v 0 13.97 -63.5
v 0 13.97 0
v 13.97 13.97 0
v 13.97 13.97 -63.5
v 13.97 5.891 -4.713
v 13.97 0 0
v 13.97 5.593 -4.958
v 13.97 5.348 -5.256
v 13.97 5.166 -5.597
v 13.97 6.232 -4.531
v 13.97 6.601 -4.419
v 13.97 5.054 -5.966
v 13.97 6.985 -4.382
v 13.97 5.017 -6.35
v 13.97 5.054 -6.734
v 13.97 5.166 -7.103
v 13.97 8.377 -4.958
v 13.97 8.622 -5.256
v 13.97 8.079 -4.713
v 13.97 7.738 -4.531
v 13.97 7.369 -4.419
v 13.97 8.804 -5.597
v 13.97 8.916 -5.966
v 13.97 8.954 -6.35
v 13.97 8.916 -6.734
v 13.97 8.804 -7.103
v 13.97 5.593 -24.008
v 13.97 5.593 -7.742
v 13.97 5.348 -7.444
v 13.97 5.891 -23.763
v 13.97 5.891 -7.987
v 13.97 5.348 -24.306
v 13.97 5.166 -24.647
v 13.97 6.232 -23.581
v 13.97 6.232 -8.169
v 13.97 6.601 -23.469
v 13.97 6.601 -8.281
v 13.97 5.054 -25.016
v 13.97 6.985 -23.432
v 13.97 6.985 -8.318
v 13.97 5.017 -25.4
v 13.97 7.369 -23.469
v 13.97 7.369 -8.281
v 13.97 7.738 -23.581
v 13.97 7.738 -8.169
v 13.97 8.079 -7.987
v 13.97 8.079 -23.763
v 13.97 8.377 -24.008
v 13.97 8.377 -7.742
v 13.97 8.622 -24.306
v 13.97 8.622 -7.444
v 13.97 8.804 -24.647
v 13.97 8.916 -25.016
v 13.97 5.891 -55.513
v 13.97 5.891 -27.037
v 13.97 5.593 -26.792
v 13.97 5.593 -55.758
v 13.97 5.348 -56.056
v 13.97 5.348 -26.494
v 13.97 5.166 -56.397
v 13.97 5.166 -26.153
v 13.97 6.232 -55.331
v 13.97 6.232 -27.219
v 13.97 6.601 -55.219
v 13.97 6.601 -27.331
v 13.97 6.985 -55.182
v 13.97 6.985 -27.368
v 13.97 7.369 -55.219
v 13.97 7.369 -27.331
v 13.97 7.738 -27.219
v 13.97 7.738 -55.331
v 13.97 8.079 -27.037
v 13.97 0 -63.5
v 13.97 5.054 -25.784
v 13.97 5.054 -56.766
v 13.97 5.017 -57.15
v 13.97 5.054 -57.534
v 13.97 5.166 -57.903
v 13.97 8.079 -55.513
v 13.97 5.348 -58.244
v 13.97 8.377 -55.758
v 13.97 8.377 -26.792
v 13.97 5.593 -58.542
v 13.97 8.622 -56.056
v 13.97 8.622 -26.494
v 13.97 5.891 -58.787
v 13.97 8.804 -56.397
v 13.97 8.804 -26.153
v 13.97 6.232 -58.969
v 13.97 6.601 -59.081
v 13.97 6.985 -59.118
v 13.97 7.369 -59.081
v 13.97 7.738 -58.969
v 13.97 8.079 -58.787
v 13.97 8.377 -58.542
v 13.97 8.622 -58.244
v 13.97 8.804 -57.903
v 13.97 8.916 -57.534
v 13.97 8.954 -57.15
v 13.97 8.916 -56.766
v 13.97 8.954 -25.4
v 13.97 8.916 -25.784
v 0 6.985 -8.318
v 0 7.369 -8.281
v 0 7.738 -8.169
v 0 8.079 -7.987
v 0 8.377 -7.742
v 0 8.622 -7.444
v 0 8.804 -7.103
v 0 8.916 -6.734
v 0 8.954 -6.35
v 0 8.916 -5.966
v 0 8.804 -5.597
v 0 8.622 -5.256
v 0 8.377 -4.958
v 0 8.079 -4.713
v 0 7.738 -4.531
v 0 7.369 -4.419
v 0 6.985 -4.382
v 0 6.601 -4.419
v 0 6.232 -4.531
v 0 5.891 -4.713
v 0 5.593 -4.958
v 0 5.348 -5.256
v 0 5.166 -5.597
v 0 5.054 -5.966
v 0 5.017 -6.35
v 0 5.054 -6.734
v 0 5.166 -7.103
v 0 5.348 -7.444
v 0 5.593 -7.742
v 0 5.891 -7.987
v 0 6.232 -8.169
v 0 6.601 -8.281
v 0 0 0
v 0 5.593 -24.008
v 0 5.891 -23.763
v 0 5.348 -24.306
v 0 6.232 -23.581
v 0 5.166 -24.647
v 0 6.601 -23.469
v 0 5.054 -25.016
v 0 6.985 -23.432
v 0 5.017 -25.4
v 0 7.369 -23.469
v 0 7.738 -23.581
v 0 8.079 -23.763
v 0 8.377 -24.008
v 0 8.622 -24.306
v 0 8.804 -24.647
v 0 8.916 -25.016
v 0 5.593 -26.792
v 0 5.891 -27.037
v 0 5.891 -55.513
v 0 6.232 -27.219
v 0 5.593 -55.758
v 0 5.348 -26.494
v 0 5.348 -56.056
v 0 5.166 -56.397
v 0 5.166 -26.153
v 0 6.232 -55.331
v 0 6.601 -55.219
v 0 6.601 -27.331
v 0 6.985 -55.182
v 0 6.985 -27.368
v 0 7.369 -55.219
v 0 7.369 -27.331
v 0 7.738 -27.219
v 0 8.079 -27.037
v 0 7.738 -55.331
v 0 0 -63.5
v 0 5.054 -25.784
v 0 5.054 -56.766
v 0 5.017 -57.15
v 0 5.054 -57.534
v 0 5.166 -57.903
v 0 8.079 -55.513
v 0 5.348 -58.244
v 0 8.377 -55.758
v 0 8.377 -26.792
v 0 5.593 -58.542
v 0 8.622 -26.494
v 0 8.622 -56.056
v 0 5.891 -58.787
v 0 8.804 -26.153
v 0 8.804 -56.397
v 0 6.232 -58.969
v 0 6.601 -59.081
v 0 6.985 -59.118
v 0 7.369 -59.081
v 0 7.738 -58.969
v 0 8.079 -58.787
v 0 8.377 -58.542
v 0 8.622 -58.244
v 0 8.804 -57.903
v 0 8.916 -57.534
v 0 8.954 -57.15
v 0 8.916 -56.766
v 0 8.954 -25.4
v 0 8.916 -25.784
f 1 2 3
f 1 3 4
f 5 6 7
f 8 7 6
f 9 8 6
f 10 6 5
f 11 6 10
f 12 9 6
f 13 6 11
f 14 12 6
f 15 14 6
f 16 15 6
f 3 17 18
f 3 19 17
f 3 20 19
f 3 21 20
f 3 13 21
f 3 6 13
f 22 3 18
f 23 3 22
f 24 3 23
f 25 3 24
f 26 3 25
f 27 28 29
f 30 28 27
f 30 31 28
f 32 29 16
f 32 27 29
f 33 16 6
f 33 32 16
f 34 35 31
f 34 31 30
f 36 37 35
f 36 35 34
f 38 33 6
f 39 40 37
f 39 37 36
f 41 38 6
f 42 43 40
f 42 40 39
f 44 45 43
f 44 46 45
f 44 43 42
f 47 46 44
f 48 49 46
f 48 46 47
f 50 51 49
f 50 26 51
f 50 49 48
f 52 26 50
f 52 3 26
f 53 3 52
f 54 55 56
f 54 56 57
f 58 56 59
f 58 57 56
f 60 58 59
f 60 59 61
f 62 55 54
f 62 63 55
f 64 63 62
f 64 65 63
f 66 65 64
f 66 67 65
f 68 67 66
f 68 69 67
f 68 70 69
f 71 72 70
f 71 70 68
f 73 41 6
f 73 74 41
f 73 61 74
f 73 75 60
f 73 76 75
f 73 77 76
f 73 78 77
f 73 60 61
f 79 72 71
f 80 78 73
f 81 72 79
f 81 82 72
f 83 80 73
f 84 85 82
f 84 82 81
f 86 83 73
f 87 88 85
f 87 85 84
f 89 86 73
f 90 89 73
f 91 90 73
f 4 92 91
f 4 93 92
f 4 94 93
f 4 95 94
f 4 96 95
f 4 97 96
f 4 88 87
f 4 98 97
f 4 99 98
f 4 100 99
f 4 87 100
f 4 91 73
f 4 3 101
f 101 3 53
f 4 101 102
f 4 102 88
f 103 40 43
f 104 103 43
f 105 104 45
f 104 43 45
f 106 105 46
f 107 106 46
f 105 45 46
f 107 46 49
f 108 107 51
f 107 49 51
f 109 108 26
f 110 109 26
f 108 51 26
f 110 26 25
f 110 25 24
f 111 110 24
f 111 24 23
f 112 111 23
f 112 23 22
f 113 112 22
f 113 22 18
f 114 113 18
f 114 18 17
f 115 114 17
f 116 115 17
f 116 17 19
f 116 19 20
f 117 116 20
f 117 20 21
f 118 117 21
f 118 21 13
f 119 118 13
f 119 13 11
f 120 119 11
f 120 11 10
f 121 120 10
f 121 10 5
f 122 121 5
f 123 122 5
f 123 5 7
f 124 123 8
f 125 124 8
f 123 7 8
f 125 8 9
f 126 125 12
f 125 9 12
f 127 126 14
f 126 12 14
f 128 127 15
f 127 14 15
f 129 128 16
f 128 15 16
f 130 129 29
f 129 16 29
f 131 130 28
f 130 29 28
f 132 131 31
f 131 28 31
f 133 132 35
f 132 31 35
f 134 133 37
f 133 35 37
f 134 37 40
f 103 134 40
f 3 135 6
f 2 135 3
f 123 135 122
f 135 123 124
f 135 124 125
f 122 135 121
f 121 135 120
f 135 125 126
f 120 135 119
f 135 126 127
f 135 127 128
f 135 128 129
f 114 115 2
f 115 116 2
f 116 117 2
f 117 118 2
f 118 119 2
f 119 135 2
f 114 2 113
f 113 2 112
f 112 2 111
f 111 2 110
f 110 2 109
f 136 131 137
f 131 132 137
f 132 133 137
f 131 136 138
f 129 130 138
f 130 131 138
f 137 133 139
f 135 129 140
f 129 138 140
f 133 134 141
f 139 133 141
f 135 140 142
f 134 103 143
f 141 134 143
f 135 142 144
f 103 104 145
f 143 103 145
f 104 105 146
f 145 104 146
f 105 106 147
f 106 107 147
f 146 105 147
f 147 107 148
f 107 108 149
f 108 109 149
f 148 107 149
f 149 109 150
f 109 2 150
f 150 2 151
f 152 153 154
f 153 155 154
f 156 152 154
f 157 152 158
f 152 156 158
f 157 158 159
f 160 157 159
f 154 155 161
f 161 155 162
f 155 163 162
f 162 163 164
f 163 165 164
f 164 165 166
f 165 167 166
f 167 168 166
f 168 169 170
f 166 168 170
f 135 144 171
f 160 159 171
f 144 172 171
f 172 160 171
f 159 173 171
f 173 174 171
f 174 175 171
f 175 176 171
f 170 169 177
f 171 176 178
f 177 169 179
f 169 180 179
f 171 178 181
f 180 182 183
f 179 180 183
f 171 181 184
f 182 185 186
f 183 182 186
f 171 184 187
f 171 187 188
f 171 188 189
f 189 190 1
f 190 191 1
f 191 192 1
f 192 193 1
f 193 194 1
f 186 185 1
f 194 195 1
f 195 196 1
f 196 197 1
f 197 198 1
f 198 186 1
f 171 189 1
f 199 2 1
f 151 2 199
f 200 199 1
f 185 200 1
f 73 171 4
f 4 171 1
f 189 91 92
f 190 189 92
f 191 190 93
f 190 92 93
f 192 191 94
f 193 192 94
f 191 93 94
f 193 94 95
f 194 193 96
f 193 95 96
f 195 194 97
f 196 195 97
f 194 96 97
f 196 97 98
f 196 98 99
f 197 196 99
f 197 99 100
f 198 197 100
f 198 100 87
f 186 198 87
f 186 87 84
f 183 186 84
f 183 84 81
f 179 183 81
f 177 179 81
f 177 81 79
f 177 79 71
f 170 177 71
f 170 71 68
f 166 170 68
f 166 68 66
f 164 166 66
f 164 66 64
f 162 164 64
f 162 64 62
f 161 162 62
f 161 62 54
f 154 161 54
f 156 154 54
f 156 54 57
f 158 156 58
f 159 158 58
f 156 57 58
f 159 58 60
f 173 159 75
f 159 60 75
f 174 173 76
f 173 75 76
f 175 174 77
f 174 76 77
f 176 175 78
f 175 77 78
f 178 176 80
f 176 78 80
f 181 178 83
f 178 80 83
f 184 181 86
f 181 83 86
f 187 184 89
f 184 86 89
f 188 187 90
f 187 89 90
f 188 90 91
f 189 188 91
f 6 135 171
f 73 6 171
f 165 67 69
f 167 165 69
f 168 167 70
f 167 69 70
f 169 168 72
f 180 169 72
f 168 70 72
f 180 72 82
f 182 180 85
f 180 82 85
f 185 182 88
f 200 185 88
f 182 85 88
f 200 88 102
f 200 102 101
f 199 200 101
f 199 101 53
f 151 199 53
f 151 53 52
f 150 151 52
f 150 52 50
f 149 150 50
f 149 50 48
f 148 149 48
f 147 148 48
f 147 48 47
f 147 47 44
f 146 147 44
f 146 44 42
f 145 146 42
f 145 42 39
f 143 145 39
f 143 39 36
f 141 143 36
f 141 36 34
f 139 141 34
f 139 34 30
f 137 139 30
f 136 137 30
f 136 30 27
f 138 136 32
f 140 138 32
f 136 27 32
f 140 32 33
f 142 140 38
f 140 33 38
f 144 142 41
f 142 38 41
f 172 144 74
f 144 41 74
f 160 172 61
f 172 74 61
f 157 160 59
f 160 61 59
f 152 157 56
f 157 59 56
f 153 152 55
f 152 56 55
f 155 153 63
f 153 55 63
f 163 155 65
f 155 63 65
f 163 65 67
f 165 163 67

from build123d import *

# Parameters (mm, degrees)
SKETCH1_W           = 63.5
SKETCH1_H           = 13.97
BOSS_EXTRUDE3_DEPTH = 13.97
SKETCH3_R           = 1.9685
CUT_EXTRUDE1_DEPTH  = 254
CUT_EXTRUDE3_DEPTH  = 254


with BuildPart() as part:
    # Sketch1 → Boss-Extrude3 (new body)
    with BuildSketch(Plane(origin=(0, 0, 0), x_dir=(0, 0, -1), z_dir=(1, 0, 0))):
        with Locations((31.75, 6.985)):
            Rectangle(SKETCH1_W, SKETCH1_H)
    extrude(amount=BOSS_EXTRUDE3_DEPTH)

    # Sketch3 → Cut-Extrude1 (cut)
    with BuildSketch(Plane(origin=(13.97, 0, 0), x_dir=(0, 0, -1), z_dir=(1, 0, 0))):
        with Locations((6.35, 6.985)):
            Circle(SKETCH3_R)
        with Locations((57.15, 6.985)):
            Circle(SKETCH3_R)
    extrude(amount=-CUT_EXTRUDE1_DEPTH, mode=Mode.SUBTRACT)

    # Sketch4 → Cut-Extrude3 (cut)
    with BuildSketch(Plane(origin=(13.97, 0, 0), x_dir=(0, 0, -1), z_dir=(1, 0, 0))):
        with BuildLine():
            ThreePointArc((23.4315, 6.985), (25.4, 5.0165), (27.3685, 6.985))
            ThreePointArc((27.3685, 6.985), (25.4, 8.9535), (23.4315, 6.985))
        make_face()
    extrude(amount=-CUT_EXTRUDE3_DEPTH, mode=Mode.SUBTRACT)


solid = part.part
